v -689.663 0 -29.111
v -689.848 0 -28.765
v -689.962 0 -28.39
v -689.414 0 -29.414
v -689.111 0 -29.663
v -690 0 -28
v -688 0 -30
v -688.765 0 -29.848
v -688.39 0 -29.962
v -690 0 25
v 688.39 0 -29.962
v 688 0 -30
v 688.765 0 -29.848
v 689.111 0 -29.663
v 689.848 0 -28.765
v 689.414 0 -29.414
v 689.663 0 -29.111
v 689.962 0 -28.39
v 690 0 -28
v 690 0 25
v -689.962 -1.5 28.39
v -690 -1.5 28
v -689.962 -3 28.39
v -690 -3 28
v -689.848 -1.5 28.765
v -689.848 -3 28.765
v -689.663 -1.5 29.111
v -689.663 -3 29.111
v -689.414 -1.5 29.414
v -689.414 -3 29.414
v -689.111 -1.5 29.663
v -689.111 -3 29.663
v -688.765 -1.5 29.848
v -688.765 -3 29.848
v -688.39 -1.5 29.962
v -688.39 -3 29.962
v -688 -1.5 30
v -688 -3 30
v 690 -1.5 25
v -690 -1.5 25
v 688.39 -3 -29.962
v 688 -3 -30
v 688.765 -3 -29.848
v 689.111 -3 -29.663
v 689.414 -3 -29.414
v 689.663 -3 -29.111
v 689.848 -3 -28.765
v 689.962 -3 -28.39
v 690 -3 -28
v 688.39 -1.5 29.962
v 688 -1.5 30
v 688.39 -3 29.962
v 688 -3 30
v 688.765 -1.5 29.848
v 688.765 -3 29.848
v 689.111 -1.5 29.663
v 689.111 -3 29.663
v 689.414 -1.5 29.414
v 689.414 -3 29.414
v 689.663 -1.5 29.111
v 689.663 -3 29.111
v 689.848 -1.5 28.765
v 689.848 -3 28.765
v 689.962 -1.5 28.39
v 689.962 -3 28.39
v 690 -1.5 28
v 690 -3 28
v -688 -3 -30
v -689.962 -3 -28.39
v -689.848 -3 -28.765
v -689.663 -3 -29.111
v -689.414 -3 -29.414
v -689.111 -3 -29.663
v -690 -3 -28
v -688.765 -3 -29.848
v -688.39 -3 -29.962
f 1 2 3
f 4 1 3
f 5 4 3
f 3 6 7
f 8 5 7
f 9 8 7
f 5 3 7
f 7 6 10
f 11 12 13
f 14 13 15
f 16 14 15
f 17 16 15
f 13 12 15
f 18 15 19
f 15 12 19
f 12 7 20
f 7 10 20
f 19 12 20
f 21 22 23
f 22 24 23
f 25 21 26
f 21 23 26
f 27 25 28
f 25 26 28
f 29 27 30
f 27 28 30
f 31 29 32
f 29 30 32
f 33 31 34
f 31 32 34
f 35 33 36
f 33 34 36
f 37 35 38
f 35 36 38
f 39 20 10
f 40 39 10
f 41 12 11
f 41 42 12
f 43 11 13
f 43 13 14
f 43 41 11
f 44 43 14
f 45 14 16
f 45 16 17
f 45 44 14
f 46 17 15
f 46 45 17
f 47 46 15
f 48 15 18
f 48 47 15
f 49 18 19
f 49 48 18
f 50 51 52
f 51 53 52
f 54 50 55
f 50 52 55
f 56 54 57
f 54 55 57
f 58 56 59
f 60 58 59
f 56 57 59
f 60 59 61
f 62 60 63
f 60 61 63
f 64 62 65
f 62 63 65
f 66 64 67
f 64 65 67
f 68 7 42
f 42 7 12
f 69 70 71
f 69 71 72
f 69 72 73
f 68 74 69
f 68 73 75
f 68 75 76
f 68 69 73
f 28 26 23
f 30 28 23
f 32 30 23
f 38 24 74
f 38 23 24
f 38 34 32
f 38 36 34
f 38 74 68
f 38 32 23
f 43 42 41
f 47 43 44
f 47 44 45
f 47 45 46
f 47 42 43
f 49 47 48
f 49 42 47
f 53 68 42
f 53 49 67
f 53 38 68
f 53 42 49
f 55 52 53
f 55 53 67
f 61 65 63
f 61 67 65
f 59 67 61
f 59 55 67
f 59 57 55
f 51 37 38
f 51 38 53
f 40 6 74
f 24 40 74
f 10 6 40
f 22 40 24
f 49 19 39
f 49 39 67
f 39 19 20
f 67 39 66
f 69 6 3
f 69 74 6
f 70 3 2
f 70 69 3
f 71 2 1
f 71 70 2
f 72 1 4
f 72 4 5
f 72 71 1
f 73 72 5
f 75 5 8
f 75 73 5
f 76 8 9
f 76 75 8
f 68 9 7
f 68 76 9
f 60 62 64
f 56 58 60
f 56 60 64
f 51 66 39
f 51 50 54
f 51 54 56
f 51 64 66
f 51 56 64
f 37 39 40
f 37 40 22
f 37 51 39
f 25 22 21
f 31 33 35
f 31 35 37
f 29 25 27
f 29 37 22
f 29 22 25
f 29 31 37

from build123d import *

# Parameters (mm, degrees)
F0_W     = 1380
F0_H     = 60
F1_DEPTH = 3
F2_W     = 1380
F2_H     = 5
F3_DEPTH = 1.5
F4_R     = 2


with BuildPart() as f1:
    # F0 (on Front) → F1 (new body)
    with BuildSketch(Plane.XZ):
        Rectangle(F0_W, F0_H)
    extrude(amount=F1_DEPTH)

    # F2 (on face) → F3 (cut)
    with BuildSketch(Plane(origin=(0, 0, 0), x_dir=(-1, 0, 0), z_dir=(0, 1, 0))):
        with Locations((0, 27.5)):
            Rectangle(F2_W, F2_H)
    extrude(amount=-F3_DEPTH, mode=Mode.SUBTRACT)

    # F4
    f4_edges = [f1.edges().sort_by_distance(p)[0] for p in [
        (690, -2.25, 30),
        (690, -1.5, -30),
        (-690, -2.25, 30),
        (-690, -1.5, -30),
    ]]
    fillet(f4_edges, radius=F4_R)


solid = f1.part
